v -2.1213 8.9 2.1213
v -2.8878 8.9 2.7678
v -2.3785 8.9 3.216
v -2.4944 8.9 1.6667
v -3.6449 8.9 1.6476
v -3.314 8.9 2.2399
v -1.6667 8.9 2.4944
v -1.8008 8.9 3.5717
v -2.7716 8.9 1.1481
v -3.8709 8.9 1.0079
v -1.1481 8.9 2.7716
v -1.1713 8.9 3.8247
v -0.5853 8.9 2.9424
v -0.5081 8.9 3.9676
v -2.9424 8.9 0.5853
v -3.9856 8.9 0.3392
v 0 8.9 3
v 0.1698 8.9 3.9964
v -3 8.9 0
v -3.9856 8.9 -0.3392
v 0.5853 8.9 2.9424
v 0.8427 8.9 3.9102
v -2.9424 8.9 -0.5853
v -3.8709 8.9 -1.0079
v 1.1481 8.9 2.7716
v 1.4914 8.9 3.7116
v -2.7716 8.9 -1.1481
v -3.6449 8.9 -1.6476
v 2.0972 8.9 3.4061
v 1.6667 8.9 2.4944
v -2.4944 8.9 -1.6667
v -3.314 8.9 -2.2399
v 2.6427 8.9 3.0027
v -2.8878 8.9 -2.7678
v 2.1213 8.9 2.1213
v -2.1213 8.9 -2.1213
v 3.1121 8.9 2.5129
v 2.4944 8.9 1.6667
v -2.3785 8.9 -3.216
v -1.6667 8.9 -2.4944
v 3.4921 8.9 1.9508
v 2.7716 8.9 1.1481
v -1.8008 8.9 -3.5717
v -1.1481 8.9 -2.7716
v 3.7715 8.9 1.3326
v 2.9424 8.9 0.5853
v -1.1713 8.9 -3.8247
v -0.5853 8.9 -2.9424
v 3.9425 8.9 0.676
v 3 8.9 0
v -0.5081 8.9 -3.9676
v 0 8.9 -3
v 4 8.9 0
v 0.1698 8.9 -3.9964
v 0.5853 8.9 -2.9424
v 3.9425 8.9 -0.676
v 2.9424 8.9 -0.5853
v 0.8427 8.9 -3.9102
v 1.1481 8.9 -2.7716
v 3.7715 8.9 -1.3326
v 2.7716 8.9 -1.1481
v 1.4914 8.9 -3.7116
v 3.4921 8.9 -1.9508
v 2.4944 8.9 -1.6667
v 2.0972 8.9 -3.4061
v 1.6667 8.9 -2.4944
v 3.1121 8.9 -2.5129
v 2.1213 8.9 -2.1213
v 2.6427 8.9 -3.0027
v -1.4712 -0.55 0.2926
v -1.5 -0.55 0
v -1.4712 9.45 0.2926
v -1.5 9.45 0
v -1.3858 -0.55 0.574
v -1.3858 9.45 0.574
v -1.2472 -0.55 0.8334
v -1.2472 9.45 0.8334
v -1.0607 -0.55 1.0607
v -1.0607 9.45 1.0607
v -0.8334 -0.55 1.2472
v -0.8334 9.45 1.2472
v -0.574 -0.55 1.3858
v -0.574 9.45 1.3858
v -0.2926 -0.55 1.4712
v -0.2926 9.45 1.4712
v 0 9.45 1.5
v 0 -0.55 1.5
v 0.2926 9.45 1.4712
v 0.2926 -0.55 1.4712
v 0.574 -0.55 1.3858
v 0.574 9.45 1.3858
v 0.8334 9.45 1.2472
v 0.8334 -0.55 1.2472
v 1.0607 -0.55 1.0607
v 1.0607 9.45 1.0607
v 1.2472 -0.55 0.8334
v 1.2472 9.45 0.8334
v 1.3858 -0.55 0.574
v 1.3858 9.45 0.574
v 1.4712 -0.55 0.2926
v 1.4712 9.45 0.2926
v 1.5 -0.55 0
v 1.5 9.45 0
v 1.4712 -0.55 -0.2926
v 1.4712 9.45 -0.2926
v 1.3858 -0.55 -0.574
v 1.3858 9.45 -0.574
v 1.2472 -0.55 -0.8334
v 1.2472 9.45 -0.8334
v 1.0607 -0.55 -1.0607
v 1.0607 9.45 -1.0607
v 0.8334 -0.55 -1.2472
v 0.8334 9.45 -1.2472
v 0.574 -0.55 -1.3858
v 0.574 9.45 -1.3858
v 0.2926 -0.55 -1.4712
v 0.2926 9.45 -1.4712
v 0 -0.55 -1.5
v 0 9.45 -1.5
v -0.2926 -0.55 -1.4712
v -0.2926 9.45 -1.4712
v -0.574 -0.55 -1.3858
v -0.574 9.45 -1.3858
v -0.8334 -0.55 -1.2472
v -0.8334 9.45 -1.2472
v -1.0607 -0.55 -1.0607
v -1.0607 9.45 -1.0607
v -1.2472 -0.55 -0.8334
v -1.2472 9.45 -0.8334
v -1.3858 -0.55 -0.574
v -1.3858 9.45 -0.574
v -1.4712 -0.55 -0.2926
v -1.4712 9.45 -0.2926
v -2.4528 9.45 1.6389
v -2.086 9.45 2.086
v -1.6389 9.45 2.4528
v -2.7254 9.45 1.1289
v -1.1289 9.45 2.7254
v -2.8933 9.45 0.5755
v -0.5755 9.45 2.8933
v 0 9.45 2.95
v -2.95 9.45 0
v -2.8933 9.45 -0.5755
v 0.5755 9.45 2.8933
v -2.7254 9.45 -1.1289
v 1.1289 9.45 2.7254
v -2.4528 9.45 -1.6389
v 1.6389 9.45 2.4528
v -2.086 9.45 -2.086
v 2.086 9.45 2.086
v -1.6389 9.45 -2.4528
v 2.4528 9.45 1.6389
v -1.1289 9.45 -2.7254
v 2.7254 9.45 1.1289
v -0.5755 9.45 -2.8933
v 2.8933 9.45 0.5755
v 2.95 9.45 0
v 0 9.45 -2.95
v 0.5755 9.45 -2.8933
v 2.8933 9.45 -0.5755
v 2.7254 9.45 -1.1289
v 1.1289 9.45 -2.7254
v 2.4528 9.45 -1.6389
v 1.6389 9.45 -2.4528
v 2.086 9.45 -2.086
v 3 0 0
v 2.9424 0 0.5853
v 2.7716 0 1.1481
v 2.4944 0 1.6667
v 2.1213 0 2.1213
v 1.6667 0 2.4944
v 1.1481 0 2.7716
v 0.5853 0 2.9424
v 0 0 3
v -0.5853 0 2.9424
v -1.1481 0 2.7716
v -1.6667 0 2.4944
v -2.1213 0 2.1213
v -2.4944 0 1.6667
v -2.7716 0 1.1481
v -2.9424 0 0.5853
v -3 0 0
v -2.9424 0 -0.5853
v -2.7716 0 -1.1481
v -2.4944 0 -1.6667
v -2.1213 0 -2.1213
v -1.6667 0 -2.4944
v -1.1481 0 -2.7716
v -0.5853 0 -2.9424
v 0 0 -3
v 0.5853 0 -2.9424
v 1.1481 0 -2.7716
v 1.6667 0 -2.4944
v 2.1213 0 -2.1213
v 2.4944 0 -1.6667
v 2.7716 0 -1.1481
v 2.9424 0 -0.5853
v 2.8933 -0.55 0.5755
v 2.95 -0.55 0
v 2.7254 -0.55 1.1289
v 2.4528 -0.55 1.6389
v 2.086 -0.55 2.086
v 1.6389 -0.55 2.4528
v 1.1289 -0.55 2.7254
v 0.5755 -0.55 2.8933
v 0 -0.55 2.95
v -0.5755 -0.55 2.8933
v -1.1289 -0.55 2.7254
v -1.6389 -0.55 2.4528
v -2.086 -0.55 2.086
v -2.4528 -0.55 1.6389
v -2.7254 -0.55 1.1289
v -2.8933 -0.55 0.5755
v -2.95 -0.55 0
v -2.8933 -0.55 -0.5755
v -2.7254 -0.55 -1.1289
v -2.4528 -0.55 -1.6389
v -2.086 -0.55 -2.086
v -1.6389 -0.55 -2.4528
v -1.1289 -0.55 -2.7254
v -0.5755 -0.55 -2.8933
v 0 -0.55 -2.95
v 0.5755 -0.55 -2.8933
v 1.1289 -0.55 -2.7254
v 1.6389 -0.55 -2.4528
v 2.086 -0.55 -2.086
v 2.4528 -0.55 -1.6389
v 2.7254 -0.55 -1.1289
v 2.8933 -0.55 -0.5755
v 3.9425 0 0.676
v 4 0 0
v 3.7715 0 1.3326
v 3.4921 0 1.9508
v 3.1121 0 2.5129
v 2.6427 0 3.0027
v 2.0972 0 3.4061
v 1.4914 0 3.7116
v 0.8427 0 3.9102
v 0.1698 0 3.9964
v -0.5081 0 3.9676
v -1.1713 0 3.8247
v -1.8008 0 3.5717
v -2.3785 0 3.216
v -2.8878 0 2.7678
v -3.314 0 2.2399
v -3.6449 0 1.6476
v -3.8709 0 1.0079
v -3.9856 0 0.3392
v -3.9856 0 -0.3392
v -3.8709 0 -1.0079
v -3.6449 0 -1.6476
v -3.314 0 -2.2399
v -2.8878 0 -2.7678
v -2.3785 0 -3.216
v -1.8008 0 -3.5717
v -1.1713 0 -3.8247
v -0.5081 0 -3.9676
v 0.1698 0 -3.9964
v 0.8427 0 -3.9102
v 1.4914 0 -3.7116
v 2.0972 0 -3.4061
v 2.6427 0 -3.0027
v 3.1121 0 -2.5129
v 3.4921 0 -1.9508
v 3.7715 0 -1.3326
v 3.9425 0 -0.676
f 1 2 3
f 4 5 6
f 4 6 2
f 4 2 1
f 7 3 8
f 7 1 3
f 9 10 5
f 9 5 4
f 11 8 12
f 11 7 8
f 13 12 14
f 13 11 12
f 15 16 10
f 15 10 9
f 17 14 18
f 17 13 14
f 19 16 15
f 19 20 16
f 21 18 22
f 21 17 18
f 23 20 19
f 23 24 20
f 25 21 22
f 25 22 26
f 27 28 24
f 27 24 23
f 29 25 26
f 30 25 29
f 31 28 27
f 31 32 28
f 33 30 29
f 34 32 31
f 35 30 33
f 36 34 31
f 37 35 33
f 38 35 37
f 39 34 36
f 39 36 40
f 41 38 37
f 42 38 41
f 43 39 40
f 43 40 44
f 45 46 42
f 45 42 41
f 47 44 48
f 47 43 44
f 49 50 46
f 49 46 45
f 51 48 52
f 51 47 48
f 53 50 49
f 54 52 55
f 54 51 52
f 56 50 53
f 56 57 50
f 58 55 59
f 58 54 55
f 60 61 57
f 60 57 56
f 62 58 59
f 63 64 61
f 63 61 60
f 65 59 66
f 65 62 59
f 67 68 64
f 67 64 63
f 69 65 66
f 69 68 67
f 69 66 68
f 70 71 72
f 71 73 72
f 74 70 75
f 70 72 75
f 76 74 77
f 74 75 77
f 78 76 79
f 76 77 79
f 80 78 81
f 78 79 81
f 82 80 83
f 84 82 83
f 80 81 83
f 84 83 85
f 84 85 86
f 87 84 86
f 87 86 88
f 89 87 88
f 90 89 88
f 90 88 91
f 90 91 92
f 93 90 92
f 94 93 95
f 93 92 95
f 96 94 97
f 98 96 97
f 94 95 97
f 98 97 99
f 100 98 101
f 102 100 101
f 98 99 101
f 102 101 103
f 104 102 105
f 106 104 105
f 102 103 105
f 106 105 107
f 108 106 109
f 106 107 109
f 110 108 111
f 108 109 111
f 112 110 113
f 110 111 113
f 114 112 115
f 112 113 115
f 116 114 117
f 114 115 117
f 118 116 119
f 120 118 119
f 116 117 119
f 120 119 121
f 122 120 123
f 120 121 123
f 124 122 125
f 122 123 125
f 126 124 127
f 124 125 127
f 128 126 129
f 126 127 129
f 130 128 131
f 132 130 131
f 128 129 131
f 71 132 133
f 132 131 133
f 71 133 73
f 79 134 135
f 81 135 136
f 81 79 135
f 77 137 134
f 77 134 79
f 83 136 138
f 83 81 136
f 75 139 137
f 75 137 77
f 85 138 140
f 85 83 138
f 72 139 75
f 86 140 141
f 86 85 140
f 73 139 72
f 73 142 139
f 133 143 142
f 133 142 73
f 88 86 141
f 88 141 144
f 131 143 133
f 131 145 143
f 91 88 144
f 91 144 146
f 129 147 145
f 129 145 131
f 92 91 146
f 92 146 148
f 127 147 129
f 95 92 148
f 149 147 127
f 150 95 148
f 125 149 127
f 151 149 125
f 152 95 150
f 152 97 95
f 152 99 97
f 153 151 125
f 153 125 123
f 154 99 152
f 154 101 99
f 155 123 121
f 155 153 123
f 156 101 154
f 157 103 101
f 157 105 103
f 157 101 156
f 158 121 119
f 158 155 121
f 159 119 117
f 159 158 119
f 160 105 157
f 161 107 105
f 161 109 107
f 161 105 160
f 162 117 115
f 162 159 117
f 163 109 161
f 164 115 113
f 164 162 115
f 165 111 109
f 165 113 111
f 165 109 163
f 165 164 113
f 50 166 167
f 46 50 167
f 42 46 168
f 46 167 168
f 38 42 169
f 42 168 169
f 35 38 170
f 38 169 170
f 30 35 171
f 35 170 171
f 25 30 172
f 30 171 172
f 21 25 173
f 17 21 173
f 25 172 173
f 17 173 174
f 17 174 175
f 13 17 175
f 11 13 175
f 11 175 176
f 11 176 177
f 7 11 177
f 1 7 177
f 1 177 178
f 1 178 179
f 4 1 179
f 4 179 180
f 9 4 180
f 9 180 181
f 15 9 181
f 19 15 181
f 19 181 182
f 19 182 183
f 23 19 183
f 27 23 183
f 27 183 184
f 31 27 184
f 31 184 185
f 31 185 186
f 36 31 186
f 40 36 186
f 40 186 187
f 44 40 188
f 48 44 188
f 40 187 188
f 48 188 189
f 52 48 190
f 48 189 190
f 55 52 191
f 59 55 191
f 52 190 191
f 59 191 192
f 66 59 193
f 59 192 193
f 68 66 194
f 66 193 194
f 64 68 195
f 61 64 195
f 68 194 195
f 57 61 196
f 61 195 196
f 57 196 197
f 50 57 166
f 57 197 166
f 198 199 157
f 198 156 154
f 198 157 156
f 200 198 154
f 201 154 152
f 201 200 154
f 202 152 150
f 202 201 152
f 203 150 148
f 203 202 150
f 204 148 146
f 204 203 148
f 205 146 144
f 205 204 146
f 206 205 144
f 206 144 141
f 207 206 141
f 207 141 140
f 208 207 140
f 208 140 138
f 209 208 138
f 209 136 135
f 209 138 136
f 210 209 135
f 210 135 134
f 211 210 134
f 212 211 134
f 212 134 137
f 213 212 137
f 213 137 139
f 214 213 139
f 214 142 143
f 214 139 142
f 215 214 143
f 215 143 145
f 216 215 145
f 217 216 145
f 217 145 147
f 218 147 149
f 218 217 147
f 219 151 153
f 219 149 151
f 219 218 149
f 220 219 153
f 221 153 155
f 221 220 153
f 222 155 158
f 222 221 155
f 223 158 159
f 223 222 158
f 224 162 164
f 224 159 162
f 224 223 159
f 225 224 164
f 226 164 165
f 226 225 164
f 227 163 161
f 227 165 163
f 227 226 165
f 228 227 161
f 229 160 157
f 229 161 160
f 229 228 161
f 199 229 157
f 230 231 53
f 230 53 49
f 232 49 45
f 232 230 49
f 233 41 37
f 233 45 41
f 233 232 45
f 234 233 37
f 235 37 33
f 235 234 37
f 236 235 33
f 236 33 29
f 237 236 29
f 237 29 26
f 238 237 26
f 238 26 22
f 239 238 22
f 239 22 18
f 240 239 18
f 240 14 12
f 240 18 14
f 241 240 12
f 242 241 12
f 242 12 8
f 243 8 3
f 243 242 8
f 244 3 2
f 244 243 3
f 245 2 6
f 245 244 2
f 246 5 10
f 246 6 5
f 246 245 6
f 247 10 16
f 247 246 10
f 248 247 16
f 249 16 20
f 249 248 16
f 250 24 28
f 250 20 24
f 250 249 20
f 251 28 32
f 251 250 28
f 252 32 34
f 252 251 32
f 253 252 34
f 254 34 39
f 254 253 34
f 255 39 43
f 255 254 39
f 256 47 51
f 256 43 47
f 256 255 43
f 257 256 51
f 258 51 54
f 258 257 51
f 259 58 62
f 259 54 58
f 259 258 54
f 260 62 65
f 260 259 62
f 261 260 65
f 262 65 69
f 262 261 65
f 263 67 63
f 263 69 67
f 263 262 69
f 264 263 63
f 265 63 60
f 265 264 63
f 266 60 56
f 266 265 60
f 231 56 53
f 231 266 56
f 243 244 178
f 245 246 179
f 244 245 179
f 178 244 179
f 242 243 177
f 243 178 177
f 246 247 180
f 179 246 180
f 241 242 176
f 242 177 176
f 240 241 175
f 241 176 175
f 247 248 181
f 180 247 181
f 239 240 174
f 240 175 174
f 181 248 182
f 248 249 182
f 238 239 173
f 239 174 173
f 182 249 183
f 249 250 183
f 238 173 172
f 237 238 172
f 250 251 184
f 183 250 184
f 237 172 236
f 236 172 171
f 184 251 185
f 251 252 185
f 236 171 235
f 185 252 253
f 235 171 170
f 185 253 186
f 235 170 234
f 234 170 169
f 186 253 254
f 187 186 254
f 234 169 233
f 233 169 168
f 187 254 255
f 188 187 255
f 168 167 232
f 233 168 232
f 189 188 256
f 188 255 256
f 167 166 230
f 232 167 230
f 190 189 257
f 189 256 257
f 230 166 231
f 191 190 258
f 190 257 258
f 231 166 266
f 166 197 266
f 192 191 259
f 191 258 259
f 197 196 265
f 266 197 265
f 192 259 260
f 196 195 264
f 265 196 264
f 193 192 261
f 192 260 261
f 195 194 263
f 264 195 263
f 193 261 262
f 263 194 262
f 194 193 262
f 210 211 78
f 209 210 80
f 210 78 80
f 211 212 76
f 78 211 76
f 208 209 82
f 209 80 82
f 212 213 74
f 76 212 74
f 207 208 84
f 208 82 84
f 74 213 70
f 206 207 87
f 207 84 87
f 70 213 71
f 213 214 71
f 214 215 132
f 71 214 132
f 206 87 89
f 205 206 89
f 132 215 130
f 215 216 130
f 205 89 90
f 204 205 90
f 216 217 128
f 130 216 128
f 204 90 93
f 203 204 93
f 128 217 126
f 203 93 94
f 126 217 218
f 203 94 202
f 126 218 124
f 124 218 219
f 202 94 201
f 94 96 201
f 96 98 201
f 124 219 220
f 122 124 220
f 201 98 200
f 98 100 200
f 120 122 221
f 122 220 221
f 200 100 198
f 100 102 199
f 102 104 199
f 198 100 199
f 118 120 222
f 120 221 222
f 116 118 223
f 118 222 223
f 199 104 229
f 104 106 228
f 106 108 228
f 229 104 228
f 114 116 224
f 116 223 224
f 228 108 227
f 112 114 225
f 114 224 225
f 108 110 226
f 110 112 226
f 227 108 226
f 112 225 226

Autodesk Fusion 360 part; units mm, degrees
sketch "Sketch1" plane through (0, 0, 0) normal (0, 1, 0) x (1, 0, 0) in component "outer"
  circle A0 centre (0, 0) radius 4
  dimension "d1" = 8
extrude "Extrude1" add sketch "Sketch1" along normal blind 8.9 makes body 1 in component "outer"
sketch "Sketch2" plane through (0, 0, 0) normal (0, -1, 0) x (1, 0, 0) in component "outer"
  circle A0 centre (0, 0) radius 4
  circle A1 centre (0, 0) radius 3
  dimension "d4" = 6
extrude "Extrude2" cut sketch "Sketch2" against normal blind 12 contours A1 bodies 1 in component "outer"
sketch "Sketch1 (2)" plane through (0, 0, 0) normal (0, 1, 0) x (1, 0, 0) in component "inner"
  circle A0 centre (0, 0) radius 2.95
  dimension "d7" = 5.9
extrude "Extrude1'" add sketch "Sketch1 (2)" along normal blind 10 separate body makes body 2 in component "inner"
sketch "Sketch2 (2)" plane through (0, 10, 0) normal (0, 1, 0) x (-1, 0, 0) in component "inner"
  circle A0 centre (0, 0) radius 2.95
  circle A1 centre (0, 0) radius 1.5
  dimension "d10" = 3
extrude "Extrude2'" cut sketch "Sketch2 (2)" against normal blind 11 contours A1 bodies 2 in component "inner"
component "outer" placed x (1, 0, 0) y (0, 1, 0) z (0, 0, 1) at (0, 0, 0)
component "inner" placed x (1, 0, 0) y (0, 1, 0) z (0, 0, 1) at (0, -0.55, 0)
